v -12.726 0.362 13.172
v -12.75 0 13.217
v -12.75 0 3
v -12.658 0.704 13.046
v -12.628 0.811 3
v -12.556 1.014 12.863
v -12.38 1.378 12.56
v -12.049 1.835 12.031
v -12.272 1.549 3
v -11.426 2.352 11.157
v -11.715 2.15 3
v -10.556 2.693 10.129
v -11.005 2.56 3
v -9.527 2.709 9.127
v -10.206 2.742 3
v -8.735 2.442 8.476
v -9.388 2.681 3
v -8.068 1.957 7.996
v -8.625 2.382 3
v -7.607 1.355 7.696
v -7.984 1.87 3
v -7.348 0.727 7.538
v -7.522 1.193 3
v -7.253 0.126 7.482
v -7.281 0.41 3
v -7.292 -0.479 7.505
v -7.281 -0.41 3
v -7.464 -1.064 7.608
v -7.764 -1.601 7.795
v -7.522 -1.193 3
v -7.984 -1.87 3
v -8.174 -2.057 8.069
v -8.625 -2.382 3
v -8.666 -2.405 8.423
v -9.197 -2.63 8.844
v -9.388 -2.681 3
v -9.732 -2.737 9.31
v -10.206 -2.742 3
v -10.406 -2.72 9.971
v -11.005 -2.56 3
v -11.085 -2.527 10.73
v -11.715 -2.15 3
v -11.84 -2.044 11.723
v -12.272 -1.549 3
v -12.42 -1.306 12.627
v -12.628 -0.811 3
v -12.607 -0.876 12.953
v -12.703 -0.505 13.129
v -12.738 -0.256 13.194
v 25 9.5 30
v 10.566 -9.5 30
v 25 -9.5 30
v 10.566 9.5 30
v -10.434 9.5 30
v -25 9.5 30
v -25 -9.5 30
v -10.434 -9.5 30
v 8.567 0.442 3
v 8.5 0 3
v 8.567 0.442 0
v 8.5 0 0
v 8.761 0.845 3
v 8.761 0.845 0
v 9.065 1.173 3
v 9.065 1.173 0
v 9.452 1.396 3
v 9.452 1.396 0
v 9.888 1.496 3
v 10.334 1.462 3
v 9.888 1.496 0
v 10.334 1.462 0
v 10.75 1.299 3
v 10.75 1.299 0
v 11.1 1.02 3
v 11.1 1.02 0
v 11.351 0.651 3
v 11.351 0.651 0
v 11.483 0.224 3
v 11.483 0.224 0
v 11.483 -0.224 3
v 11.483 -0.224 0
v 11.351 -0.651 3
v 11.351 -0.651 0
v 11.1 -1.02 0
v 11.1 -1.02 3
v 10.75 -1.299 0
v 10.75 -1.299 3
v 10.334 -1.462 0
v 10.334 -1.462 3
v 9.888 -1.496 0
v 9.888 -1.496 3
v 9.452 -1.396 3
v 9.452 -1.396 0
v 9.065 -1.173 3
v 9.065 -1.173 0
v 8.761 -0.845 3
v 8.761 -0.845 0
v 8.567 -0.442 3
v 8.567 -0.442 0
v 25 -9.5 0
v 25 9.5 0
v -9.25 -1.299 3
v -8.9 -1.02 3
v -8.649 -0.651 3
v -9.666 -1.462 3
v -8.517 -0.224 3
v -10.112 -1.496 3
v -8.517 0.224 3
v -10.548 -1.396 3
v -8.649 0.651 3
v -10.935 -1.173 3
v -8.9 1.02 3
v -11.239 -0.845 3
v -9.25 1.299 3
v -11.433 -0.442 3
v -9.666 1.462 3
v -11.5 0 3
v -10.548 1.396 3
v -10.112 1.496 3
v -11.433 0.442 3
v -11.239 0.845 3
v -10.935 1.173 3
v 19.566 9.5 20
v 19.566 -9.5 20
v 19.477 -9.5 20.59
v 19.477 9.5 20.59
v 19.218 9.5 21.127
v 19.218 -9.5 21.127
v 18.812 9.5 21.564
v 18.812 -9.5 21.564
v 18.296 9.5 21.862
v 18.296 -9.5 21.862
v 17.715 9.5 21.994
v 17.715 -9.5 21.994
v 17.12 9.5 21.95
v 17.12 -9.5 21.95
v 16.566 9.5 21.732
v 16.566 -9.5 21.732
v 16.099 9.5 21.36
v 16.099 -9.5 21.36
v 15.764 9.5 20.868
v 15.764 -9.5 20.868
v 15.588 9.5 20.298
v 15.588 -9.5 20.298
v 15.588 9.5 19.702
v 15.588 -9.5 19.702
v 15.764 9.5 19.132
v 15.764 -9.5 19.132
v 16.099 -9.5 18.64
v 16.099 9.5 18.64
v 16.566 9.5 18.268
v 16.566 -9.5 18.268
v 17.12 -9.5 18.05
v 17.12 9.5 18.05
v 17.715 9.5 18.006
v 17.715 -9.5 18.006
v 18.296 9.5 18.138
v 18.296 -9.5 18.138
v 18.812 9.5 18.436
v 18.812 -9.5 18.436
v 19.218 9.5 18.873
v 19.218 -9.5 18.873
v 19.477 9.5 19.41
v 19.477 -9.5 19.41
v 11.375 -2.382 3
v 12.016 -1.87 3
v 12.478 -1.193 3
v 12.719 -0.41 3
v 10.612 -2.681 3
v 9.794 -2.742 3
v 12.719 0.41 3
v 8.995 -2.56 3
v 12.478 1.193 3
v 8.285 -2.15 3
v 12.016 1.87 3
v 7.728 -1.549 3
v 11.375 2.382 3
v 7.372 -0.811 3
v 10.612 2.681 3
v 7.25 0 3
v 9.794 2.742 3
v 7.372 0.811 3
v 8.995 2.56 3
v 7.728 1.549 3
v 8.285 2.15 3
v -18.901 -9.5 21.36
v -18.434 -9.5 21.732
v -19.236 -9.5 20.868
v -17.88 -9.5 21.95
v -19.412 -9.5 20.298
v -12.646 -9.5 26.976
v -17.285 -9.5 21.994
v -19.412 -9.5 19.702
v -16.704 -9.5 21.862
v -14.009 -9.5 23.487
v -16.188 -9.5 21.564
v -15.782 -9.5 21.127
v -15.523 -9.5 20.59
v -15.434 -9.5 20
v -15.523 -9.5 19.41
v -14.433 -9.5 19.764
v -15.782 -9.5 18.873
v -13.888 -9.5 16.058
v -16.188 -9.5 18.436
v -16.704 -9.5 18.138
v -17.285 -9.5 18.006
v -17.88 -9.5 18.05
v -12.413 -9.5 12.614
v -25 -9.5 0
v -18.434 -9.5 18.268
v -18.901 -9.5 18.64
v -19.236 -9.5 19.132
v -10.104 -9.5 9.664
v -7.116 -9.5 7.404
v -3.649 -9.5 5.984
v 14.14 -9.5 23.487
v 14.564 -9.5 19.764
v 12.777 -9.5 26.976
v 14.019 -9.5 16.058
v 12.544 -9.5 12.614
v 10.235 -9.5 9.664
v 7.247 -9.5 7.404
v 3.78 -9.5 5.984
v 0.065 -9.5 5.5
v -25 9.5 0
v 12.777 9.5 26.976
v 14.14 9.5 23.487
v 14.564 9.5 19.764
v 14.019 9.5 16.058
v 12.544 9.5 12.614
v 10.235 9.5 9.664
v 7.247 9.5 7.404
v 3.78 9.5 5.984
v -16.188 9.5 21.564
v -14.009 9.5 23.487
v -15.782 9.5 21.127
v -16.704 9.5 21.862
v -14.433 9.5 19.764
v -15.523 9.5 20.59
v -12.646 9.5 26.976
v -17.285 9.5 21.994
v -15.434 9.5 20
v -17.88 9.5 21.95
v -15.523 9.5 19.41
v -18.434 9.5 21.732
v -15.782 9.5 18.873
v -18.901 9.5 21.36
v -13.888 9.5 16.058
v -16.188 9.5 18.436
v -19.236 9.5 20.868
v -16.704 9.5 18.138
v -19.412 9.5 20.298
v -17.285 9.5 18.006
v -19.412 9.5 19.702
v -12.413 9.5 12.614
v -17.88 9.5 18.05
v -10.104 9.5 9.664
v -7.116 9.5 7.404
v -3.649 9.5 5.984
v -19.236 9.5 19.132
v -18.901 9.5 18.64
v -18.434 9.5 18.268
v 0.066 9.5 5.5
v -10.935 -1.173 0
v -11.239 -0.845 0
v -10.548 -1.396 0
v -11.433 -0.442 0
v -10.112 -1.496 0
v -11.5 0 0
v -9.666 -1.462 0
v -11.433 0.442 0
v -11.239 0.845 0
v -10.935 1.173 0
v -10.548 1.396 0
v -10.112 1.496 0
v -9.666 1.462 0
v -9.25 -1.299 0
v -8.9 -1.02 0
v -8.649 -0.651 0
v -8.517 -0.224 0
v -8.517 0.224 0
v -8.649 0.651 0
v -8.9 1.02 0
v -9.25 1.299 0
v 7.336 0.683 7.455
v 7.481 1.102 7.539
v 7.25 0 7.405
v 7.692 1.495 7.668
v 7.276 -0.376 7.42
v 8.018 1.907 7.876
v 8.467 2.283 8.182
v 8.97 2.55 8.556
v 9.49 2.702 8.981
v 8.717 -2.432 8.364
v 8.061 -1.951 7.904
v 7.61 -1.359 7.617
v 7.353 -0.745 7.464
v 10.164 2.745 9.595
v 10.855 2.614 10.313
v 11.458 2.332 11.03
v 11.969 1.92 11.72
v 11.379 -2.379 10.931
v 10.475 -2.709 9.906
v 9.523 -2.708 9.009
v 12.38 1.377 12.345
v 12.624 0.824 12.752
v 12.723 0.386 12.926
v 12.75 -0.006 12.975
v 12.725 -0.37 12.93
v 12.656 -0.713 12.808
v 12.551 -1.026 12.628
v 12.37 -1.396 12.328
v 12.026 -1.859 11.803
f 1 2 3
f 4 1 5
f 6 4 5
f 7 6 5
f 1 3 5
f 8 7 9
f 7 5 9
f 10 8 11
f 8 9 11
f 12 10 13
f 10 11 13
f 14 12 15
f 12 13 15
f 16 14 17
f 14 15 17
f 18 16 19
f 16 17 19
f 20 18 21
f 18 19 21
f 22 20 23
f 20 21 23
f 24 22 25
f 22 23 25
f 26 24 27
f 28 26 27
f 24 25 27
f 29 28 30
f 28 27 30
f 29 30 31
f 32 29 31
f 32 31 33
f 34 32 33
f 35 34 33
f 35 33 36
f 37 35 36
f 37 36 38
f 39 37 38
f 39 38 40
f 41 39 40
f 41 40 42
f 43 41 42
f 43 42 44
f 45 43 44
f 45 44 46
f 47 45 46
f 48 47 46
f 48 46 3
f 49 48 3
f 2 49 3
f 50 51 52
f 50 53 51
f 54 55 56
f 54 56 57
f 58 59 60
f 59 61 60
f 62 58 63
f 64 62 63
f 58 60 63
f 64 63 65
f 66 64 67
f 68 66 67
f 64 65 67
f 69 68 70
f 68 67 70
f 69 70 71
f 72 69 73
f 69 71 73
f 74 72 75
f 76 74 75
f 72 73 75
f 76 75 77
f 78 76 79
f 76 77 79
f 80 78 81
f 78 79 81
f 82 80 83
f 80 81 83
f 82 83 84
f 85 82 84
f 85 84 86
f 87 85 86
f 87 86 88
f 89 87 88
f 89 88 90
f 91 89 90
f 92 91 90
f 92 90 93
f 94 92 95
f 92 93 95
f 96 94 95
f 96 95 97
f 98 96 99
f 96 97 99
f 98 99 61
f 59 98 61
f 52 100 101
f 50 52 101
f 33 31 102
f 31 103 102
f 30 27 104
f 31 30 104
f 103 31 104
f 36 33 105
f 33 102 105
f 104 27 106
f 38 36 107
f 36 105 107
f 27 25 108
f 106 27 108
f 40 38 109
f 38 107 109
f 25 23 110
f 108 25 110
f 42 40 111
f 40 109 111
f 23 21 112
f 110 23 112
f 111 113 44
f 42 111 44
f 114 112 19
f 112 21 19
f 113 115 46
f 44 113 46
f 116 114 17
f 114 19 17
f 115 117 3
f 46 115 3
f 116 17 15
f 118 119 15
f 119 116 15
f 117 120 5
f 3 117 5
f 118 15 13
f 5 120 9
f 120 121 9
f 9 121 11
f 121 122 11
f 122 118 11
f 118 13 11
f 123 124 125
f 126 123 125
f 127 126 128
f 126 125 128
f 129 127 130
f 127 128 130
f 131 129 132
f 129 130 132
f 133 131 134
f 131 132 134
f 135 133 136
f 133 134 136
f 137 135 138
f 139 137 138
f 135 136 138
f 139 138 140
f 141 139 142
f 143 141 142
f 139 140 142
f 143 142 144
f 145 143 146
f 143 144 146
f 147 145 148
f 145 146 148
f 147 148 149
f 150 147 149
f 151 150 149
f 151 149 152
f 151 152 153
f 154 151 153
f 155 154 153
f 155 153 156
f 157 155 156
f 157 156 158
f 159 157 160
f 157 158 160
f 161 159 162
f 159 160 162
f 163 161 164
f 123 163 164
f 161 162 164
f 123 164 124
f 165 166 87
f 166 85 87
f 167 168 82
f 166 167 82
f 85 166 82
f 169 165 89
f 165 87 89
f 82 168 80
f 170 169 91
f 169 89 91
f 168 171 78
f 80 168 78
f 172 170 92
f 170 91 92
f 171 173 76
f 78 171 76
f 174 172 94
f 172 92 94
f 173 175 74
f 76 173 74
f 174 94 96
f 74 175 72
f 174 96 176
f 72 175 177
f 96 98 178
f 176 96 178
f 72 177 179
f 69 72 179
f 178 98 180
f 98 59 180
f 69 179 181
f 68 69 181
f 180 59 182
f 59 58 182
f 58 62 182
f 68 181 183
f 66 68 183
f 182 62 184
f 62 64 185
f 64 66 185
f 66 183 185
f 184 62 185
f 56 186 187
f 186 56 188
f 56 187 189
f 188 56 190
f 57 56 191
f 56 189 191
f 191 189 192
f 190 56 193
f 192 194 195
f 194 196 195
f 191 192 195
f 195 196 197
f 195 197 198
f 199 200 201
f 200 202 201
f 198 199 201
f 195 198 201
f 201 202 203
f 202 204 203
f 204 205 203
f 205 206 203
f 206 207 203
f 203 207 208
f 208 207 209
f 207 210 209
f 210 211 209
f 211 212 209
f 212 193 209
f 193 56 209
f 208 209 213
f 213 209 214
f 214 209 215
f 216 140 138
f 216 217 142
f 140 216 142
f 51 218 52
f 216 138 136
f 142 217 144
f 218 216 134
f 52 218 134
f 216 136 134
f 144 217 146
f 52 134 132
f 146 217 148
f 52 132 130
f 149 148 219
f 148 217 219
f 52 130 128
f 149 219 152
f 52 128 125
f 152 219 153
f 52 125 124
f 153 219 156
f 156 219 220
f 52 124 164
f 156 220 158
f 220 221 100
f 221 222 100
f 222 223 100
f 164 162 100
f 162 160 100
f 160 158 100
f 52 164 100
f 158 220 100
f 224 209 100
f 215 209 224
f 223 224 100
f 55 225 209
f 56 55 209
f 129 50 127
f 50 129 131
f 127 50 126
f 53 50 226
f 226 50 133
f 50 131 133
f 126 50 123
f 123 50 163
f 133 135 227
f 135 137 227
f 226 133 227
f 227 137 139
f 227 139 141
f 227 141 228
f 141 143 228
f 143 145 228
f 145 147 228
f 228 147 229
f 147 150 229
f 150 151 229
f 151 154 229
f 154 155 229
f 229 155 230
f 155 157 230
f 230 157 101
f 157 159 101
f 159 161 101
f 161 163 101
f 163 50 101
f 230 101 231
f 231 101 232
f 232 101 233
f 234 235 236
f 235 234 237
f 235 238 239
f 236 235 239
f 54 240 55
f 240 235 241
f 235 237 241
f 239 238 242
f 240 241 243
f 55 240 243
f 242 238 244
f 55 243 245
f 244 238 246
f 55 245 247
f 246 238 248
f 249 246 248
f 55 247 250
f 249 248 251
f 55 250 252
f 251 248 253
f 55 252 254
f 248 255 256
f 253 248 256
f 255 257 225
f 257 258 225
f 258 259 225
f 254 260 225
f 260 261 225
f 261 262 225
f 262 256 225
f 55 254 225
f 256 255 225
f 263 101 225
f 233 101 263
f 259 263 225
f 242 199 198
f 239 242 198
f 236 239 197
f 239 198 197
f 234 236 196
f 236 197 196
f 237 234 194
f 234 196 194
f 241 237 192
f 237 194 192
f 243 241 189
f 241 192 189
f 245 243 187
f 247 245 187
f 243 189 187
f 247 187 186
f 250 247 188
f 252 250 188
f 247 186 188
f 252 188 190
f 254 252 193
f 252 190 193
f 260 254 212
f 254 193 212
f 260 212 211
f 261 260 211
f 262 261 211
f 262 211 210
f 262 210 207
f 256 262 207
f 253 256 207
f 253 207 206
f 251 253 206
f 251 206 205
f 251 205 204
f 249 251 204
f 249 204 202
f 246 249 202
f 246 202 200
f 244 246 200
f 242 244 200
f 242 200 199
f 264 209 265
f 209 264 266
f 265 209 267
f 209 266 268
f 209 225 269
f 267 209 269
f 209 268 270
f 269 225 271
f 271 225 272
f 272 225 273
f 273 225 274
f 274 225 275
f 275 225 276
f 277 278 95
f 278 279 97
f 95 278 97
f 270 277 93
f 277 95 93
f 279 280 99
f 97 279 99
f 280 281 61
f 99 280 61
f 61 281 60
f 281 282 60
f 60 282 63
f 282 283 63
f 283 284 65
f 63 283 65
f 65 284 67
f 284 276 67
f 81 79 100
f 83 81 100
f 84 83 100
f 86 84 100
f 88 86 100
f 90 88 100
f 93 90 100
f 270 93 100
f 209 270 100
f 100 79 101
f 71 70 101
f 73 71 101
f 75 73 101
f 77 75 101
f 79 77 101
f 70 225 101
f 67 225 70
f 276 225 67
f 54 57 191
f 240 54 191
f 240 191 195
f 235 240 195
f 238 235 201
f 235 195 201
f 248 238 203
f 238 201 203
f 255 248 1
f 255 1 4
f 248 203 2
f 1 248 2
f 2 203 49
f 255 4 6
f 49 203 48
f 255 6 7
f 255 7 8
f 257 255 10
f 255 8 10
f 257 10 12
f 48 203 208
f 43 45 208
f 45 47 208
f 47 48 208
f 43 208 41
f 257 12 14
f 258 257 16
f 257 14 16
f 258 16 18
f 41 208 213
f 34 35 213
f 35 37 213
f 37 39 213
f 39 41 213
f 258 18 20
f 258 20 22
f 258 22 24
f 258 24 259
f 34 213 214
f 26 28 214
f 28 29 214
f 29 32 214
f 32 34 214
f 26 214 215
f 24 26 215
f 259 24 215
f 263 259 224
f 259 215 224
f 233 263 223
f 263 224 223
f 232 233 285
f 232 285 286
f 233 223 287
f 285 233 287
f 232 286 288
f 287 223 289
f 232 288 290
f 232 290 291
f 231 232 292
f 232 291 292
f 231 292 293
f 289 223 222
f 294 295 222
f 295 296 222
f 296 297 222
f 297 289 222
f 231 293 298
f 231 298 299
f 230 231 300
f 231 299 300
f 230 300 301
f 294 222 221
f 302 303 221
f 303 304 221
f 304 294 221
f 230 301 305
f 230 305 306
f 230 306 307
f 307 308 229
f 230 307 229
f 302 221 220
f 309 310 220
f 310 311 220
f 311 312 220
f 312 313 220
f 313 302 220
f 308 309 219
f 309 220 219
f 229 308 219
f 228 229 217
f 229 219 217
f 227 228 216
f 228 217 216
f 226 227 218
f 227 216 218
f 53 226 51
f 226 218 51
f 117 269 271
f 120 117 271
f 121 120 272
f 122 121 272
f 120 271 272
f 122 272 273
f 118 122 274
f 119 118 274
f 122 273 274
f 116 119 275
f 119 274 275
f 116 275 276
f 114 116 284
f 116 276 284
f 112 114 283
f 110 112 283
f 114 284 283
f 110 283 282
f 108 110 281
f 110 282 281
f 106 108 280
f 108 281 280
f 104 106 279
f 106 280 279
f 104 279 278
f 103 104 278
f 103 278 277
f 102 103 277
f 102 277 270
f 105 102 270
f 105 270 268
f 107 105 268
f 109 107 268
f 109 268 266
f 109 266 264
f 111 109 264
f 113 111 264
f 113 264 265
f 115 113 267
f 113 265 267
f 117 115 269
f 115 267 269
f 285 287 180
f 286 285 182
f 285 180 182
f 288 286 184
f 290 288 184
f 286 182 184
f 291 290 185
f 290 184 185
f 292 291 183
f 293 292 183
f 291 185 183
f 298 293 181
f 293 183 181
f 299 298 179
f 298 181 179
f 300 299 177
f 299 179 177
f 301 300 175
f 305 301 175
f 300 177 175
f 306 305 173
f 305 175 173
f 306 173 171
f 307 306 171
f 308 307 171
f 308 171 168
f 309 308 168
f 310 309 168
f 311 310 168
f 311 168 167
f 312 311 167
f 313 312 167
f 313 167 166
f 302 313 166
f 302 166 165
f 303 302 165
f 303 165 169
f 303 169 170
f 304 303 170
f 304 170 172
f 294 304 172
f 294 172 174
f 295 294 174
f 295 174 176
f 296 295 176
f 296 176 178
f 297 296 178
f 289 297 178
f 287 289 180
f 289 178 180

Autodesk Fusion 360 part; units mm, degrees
sketch "Sketch1" plane through (0, 0, 0) normal (0, 0, 1) x (1, 0, 0)
  line L0 (25, 9.5) -> (-25, 9.5)
  line L1 (-25, 9.5) -> (-25, -9.5)
  line L2 (-25, -9.5) -> (25, -9.5)
  line L3 (25, -9.5) -> (25, 9.5)
  line L4 (25, 9.5) -> (-25, -9.5) construction
  line L5 (-25, 9.5) -> (25, -9.5) construction
  line L6 (60, -9.5) -> (110, -9.5)
  line L7 (110, -9.5) -> (110, 9.5)
  line L8 (110, 9.5) -> (60, 9.5)
  line L9 (60, 9.5) -> (60, -9.5)
  line L10 (60, -9.5) -> (110, 9.5) construction
  line L11 (110, -9.5) -> (60, 9.5) construction
  circle A0 centre (75, 0) radius 2
  circle A1 centre (95, 0) radius 2
  point P0 (85, 0)
  dimension "d1" = 50
  dimension "d2" = 19
  dimension "d22" = 50
  dimension "d23" = 19
  dimension "d26" = 4
  dimension "d27" = 4
extrude "Extrude1" add sketch "Sketch1" along normal blind 30 contours L0 L1 L2 L3
sketch "Sketch2" plane through (0, -9.5, 0) normal (0, -1, 0) x (1, 0, 0)
  line L0 (-25, 0) -> (25, 0)
  line L1 (25, 0) -> (25, 30)
  line L2 (25, 30) -> (-25, 30)
  line L3 (-25, 30) -> (-25, 0)
  circle A0 centre (0.0655, 20) radius 14.5
  line L4 (-40, 20) -> (55, 20)
  circle A1 centre (17.5655, 20) radius 2
  circle A2 centre (-17.4345, 20) radius 2
  dimension "d5" = 29
  dimension "d10" = 4
  dimension "d11" = 17.5
  dimension "d12" = 4
  dimension "d13" = 17.5
extrude "Extrude2" cut sketch "Sketch2" against normal blind 19 contours L4 A2 | L4 A2 | L4 A1 | L4 A1 | L2 A0 L4 | A0 L4
sketch "Sketch3" plane through (0, 0, 0) normal (0, 0, -1) x (-1, 0, 0)
  line L0 (-25, 9.5) -> (-25, -9.5)
  line L1 (-25, -9.5) -> (25, -9.5)
  line L2 (25, -9.5) -> (25, 9.5)
  line L3 (25, 9.5) -> (-25, 9.5)
  circle A0 centre (-10, 0) radius 1.5
  circle A1 centre (-10, 0) radius 2.75
  circle A2 centre (10, 0) radius 1.5
  circle A3 centre (10, 0) radius 2.75
  dimension "d14" = 3
  dimension "d15" = 5.5
  dimension "d16" = 3
  dimension "d17" = 5.5
extrude "Extrude3" cut sketch "Sketch3" against normal blind 15 contours A0 | A1 | A2 | A3
extrude "Extrude4" add sketch "Sketch3" against normal blind 3 contours A1 | A3
